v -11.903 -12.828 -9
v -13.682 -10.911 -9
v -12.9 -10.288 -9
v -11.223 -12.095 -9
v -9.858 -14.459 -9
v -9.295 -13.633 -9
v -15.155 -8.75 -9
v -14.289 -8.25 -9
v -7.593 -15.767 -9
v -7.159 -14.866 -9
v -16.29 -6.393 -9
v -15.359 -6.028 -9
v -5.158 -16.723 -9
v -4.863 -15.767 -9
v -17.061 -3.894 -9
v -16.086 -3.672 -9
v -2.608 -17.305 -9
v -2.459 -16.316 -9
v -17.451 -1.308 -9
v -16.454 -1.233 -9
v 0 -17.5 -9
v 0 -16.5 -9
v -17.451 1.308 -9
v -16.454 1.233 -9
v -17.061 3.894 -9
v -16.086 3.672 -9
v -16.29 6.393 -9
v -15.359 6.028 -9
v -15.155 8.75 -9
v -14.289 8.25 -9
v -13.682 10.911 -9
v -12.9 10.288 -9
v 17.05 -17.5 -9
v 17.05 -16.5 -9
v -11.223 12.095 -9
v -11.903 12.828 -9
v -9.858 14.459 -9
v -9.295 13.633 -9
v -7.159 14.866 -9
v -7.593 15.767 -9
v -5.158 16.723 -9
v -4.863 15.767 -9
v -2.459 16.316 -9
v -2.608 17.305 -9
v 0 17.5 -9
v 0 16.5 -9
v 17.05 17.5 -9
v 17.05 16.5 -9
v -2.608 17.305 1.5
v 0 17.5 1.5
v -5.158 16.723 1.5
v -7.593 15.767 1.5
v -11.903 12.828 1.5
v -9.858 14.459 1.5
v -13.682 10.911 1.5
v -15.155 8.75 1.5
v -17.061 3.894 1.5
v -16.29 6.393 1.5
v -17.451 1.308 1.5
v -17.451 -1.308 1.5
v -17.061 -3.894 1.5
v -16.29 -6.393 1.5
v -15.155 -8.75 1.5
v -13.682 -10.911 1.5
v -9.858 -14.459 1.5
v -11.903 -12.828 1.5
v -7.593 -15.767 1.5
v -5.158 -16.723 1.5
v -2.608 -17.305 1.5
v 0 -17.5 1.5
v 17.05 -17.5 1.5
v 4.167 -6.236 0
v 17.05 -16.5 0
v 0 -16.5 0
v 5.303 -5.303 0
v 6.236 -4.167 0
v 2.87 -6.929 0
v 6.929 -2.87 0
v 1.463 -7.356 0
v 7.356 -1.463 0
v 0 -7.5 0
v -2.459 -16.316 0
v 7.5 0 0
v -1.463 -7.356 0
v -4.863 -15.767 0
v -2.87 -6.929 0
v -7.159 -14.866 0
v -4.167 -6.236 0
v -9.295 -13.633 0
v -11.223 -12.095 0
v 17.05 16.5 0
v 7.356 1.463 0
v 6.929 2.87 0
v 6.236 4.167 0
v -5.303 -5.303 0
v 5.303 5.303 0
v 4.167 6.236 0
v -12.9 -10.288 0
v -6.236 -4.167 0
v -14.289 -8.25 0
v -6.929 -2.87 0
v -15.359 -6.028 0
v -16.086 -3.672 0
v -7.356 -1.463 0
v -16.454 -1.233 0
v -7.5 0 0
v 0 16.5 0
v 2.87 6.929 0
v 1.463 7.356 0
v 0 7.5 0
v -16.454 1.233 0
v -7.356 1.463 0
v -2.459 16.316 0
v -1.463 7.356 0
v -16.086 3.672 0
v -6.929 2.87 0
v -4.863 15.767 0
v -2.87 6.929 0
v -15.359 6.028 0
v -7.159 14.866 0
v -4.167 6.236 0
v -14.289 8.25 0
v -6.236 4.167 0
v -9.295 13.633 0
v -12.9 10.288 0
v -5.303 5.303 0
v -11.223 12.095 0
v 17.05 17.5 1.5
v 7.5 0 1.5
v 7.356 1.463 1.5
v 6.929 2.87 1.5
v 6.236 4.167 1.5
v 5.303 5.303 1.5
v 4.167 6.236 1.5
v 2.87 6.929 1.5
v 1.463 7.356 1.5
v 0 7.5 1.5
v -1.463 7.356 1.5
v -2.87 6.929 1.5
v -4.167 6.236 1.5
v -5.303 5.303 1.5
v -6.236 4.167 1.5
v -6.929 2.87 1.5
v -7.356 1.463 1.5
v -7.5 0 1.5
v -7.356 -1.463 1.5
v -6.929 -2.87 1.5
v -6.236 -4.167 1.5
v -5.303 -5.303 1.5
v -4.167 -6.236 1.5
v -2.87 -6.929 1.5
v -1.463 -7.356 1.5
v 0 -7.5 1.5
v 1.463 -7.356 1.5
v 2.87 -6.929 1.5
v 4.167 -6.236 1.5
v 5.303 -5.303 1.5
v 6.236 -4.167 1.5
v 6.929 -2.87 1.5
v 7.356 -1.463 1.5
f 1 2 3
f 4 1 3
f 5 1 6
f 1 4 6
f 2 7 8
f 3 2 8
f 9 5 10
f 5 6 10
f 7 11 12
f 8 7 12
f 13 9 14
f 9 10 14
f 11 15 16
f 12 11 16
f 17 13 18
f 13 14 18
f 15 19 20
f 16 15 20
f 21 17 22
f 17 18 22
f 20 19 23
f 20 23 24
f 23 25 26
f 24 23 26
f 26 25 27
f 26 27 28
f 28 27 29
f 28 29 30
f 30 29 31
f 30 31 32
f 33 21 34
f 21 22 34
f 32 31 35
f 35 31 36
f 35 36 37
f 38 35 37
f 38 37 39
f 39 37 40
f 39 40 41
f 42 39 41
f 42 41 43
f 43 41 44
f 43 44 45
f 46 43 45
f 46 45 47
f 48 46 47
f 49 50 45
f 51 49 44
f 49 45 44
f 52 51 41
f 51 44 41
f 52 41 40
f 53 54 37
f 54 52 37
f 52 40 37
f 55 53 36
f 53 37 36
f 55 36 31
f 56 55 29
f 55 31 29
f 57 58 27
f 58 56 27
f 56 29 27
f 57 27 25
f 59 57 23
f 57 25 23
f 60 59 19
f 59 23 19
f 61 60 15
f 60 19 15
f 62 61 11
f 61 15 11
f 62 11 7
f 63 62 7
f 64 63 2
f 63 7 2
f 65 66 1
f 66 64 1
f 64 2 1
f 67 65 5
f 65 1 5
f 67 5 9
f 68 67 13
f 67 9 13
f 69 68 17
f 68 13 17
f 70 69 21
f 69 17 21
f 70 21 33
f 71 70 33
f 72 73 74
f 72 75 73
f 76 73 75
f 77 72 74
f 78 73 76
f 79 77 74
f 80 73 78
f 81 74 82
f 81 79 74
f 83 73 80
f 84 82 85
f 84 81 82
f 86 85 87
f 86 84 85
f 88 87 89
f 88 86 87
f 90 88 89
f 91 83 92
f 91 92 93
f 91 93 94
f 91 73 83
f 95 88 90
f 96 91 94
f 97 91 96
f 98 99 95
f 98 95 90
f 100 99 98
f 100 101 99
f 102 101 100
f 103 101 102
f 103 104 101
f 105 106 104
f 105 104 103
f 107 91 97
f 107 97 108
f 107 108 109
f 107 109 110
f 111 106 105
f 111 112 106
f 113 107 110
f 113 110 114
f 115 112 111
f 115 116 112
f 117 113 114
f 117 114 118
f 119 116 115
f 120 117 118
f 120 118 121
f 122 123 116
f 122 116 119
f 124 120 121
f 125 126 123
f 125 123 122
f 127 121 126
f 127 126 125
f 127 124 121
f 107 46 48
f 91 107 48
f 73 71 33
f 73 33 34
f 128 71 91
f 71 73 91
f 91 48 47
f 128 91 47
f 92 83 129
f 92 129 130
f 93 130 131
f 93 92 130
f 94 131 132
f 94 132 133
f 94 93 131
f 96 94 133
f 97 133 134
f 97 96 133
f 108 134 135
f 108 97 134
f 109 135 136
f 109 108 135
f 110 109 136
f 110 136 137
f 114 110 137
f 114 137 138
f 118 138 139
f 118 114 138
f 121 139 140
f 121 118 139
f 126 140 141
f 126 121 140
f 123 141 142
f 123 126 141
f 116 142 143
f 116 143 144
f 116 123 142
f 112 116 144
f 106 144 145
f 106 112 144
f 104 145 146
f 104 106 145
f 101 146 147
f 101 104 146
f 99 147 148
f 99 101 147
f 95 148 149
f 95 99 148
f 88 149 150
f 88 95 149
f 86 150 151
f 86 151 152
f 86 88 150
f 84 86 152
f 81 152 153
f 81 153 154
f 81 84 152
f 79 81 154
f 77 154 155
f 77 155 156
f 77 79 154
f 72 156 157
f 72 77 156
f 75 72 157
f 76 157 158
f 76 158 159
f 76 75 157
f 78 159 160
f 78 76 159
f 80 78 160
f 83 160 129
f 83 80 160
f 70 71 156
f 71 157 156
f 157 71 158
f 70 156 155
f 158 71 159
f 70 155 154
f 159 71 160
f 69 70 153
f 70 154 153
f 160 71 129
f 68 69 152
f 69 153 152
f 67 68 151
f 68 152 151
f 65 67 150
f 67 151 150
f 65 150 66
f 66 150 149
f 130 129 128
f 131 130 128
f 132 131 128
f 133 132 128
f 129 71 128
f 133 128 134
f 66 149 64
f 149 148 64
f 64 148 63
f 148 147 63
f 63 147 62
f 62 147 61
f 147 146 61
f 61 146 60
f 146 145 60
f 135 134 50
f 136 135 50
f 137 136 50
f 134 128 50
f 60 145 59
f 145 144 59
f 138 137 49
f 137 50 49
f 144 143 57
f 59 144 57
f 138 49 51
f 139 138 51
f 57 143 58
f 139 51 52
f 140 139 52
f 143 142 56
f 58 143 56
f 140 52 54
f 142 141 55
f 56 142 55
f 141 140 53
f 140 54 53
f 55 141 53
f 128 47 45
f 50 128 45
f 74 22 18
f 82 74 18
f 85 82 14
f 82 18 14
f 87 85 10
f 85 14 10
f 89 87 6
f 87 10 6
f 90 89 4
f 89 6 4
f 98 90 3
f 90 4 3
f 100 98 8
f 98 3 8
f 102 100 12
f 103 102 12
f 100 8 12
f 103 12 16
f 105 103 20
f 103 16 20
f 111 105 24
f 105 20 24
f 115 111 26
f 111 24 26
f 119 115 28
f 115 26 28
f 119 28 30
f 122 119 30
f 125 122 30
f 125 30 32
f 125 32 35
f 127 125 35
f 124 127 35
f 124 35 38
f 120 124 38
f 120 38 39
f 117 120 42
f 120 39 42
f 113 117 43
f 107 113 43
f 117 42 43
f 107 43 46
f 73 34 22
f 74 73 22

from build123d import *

# Parameters (mm, degrees)
SCHIZZO1_R                   = 7.5
ESTRUSIONE_ESTRUSIONE1_DEPTH = 1.5
ESTRUSIONE_ESTRUSIONE2_START = 9
ESTRUSIONE_ESTRUSIONE2_DEPTH = 9


with BuildPart() as part:
    # Schizzo1 → Estrusione-Estrusione1 (new body)
    with BuildSketch(Plane.XY):
        with BuildLine():
            Line((17.05, -17.5), (0, -17.5))
            ThreePointArc((0, -17.5), (-17.5, 0), (0, 17.5))
            Line((0, 17.5), (17.05, 17.5))
            Line((17.05, 17.5), (17.05, -17.5))
        make_face()
        Circle(SCHIZZO1_R, mode=Mode.SUBTRACT)
    extrude(amount=ESTRUSIONE_ESTRUSIONE1_DEPTH)

    # Schizzo2 → Estrusione-Estrusione2 (add)
    with BuildSketch(Plane(origin=(0, 0, 0), x_dir=(-1, 0, 0), z_dir=(0, 0, -1)).offset(ESTRUSIONE_ESTRUSIONE2_START)):
        with BuildLine():
            Line((-17.05, 17.5), (0, 17.5))
            ThreePointArc((0, 17.5), (17.5, 0), (0, -17.5))
            Line((0, -17.5), (-17.05, -17.5))
            Line((-17.05, -17.5), (-17.05, -16.5))
            Line((-17.05, -16.5), (0, -16.5))
            ThreePointArc((0, -16.5), (16.5, 0), (0, 16.5))
            Line((0, 16.5), (-17.05, 16.5))
            Line((-17.05, 16.5), (-17.05, 17.5))
        make_face()
    extrude(amount=-ESTRUSIONE_ESTRUSIONE2_DEPTH)


solid = part.part
